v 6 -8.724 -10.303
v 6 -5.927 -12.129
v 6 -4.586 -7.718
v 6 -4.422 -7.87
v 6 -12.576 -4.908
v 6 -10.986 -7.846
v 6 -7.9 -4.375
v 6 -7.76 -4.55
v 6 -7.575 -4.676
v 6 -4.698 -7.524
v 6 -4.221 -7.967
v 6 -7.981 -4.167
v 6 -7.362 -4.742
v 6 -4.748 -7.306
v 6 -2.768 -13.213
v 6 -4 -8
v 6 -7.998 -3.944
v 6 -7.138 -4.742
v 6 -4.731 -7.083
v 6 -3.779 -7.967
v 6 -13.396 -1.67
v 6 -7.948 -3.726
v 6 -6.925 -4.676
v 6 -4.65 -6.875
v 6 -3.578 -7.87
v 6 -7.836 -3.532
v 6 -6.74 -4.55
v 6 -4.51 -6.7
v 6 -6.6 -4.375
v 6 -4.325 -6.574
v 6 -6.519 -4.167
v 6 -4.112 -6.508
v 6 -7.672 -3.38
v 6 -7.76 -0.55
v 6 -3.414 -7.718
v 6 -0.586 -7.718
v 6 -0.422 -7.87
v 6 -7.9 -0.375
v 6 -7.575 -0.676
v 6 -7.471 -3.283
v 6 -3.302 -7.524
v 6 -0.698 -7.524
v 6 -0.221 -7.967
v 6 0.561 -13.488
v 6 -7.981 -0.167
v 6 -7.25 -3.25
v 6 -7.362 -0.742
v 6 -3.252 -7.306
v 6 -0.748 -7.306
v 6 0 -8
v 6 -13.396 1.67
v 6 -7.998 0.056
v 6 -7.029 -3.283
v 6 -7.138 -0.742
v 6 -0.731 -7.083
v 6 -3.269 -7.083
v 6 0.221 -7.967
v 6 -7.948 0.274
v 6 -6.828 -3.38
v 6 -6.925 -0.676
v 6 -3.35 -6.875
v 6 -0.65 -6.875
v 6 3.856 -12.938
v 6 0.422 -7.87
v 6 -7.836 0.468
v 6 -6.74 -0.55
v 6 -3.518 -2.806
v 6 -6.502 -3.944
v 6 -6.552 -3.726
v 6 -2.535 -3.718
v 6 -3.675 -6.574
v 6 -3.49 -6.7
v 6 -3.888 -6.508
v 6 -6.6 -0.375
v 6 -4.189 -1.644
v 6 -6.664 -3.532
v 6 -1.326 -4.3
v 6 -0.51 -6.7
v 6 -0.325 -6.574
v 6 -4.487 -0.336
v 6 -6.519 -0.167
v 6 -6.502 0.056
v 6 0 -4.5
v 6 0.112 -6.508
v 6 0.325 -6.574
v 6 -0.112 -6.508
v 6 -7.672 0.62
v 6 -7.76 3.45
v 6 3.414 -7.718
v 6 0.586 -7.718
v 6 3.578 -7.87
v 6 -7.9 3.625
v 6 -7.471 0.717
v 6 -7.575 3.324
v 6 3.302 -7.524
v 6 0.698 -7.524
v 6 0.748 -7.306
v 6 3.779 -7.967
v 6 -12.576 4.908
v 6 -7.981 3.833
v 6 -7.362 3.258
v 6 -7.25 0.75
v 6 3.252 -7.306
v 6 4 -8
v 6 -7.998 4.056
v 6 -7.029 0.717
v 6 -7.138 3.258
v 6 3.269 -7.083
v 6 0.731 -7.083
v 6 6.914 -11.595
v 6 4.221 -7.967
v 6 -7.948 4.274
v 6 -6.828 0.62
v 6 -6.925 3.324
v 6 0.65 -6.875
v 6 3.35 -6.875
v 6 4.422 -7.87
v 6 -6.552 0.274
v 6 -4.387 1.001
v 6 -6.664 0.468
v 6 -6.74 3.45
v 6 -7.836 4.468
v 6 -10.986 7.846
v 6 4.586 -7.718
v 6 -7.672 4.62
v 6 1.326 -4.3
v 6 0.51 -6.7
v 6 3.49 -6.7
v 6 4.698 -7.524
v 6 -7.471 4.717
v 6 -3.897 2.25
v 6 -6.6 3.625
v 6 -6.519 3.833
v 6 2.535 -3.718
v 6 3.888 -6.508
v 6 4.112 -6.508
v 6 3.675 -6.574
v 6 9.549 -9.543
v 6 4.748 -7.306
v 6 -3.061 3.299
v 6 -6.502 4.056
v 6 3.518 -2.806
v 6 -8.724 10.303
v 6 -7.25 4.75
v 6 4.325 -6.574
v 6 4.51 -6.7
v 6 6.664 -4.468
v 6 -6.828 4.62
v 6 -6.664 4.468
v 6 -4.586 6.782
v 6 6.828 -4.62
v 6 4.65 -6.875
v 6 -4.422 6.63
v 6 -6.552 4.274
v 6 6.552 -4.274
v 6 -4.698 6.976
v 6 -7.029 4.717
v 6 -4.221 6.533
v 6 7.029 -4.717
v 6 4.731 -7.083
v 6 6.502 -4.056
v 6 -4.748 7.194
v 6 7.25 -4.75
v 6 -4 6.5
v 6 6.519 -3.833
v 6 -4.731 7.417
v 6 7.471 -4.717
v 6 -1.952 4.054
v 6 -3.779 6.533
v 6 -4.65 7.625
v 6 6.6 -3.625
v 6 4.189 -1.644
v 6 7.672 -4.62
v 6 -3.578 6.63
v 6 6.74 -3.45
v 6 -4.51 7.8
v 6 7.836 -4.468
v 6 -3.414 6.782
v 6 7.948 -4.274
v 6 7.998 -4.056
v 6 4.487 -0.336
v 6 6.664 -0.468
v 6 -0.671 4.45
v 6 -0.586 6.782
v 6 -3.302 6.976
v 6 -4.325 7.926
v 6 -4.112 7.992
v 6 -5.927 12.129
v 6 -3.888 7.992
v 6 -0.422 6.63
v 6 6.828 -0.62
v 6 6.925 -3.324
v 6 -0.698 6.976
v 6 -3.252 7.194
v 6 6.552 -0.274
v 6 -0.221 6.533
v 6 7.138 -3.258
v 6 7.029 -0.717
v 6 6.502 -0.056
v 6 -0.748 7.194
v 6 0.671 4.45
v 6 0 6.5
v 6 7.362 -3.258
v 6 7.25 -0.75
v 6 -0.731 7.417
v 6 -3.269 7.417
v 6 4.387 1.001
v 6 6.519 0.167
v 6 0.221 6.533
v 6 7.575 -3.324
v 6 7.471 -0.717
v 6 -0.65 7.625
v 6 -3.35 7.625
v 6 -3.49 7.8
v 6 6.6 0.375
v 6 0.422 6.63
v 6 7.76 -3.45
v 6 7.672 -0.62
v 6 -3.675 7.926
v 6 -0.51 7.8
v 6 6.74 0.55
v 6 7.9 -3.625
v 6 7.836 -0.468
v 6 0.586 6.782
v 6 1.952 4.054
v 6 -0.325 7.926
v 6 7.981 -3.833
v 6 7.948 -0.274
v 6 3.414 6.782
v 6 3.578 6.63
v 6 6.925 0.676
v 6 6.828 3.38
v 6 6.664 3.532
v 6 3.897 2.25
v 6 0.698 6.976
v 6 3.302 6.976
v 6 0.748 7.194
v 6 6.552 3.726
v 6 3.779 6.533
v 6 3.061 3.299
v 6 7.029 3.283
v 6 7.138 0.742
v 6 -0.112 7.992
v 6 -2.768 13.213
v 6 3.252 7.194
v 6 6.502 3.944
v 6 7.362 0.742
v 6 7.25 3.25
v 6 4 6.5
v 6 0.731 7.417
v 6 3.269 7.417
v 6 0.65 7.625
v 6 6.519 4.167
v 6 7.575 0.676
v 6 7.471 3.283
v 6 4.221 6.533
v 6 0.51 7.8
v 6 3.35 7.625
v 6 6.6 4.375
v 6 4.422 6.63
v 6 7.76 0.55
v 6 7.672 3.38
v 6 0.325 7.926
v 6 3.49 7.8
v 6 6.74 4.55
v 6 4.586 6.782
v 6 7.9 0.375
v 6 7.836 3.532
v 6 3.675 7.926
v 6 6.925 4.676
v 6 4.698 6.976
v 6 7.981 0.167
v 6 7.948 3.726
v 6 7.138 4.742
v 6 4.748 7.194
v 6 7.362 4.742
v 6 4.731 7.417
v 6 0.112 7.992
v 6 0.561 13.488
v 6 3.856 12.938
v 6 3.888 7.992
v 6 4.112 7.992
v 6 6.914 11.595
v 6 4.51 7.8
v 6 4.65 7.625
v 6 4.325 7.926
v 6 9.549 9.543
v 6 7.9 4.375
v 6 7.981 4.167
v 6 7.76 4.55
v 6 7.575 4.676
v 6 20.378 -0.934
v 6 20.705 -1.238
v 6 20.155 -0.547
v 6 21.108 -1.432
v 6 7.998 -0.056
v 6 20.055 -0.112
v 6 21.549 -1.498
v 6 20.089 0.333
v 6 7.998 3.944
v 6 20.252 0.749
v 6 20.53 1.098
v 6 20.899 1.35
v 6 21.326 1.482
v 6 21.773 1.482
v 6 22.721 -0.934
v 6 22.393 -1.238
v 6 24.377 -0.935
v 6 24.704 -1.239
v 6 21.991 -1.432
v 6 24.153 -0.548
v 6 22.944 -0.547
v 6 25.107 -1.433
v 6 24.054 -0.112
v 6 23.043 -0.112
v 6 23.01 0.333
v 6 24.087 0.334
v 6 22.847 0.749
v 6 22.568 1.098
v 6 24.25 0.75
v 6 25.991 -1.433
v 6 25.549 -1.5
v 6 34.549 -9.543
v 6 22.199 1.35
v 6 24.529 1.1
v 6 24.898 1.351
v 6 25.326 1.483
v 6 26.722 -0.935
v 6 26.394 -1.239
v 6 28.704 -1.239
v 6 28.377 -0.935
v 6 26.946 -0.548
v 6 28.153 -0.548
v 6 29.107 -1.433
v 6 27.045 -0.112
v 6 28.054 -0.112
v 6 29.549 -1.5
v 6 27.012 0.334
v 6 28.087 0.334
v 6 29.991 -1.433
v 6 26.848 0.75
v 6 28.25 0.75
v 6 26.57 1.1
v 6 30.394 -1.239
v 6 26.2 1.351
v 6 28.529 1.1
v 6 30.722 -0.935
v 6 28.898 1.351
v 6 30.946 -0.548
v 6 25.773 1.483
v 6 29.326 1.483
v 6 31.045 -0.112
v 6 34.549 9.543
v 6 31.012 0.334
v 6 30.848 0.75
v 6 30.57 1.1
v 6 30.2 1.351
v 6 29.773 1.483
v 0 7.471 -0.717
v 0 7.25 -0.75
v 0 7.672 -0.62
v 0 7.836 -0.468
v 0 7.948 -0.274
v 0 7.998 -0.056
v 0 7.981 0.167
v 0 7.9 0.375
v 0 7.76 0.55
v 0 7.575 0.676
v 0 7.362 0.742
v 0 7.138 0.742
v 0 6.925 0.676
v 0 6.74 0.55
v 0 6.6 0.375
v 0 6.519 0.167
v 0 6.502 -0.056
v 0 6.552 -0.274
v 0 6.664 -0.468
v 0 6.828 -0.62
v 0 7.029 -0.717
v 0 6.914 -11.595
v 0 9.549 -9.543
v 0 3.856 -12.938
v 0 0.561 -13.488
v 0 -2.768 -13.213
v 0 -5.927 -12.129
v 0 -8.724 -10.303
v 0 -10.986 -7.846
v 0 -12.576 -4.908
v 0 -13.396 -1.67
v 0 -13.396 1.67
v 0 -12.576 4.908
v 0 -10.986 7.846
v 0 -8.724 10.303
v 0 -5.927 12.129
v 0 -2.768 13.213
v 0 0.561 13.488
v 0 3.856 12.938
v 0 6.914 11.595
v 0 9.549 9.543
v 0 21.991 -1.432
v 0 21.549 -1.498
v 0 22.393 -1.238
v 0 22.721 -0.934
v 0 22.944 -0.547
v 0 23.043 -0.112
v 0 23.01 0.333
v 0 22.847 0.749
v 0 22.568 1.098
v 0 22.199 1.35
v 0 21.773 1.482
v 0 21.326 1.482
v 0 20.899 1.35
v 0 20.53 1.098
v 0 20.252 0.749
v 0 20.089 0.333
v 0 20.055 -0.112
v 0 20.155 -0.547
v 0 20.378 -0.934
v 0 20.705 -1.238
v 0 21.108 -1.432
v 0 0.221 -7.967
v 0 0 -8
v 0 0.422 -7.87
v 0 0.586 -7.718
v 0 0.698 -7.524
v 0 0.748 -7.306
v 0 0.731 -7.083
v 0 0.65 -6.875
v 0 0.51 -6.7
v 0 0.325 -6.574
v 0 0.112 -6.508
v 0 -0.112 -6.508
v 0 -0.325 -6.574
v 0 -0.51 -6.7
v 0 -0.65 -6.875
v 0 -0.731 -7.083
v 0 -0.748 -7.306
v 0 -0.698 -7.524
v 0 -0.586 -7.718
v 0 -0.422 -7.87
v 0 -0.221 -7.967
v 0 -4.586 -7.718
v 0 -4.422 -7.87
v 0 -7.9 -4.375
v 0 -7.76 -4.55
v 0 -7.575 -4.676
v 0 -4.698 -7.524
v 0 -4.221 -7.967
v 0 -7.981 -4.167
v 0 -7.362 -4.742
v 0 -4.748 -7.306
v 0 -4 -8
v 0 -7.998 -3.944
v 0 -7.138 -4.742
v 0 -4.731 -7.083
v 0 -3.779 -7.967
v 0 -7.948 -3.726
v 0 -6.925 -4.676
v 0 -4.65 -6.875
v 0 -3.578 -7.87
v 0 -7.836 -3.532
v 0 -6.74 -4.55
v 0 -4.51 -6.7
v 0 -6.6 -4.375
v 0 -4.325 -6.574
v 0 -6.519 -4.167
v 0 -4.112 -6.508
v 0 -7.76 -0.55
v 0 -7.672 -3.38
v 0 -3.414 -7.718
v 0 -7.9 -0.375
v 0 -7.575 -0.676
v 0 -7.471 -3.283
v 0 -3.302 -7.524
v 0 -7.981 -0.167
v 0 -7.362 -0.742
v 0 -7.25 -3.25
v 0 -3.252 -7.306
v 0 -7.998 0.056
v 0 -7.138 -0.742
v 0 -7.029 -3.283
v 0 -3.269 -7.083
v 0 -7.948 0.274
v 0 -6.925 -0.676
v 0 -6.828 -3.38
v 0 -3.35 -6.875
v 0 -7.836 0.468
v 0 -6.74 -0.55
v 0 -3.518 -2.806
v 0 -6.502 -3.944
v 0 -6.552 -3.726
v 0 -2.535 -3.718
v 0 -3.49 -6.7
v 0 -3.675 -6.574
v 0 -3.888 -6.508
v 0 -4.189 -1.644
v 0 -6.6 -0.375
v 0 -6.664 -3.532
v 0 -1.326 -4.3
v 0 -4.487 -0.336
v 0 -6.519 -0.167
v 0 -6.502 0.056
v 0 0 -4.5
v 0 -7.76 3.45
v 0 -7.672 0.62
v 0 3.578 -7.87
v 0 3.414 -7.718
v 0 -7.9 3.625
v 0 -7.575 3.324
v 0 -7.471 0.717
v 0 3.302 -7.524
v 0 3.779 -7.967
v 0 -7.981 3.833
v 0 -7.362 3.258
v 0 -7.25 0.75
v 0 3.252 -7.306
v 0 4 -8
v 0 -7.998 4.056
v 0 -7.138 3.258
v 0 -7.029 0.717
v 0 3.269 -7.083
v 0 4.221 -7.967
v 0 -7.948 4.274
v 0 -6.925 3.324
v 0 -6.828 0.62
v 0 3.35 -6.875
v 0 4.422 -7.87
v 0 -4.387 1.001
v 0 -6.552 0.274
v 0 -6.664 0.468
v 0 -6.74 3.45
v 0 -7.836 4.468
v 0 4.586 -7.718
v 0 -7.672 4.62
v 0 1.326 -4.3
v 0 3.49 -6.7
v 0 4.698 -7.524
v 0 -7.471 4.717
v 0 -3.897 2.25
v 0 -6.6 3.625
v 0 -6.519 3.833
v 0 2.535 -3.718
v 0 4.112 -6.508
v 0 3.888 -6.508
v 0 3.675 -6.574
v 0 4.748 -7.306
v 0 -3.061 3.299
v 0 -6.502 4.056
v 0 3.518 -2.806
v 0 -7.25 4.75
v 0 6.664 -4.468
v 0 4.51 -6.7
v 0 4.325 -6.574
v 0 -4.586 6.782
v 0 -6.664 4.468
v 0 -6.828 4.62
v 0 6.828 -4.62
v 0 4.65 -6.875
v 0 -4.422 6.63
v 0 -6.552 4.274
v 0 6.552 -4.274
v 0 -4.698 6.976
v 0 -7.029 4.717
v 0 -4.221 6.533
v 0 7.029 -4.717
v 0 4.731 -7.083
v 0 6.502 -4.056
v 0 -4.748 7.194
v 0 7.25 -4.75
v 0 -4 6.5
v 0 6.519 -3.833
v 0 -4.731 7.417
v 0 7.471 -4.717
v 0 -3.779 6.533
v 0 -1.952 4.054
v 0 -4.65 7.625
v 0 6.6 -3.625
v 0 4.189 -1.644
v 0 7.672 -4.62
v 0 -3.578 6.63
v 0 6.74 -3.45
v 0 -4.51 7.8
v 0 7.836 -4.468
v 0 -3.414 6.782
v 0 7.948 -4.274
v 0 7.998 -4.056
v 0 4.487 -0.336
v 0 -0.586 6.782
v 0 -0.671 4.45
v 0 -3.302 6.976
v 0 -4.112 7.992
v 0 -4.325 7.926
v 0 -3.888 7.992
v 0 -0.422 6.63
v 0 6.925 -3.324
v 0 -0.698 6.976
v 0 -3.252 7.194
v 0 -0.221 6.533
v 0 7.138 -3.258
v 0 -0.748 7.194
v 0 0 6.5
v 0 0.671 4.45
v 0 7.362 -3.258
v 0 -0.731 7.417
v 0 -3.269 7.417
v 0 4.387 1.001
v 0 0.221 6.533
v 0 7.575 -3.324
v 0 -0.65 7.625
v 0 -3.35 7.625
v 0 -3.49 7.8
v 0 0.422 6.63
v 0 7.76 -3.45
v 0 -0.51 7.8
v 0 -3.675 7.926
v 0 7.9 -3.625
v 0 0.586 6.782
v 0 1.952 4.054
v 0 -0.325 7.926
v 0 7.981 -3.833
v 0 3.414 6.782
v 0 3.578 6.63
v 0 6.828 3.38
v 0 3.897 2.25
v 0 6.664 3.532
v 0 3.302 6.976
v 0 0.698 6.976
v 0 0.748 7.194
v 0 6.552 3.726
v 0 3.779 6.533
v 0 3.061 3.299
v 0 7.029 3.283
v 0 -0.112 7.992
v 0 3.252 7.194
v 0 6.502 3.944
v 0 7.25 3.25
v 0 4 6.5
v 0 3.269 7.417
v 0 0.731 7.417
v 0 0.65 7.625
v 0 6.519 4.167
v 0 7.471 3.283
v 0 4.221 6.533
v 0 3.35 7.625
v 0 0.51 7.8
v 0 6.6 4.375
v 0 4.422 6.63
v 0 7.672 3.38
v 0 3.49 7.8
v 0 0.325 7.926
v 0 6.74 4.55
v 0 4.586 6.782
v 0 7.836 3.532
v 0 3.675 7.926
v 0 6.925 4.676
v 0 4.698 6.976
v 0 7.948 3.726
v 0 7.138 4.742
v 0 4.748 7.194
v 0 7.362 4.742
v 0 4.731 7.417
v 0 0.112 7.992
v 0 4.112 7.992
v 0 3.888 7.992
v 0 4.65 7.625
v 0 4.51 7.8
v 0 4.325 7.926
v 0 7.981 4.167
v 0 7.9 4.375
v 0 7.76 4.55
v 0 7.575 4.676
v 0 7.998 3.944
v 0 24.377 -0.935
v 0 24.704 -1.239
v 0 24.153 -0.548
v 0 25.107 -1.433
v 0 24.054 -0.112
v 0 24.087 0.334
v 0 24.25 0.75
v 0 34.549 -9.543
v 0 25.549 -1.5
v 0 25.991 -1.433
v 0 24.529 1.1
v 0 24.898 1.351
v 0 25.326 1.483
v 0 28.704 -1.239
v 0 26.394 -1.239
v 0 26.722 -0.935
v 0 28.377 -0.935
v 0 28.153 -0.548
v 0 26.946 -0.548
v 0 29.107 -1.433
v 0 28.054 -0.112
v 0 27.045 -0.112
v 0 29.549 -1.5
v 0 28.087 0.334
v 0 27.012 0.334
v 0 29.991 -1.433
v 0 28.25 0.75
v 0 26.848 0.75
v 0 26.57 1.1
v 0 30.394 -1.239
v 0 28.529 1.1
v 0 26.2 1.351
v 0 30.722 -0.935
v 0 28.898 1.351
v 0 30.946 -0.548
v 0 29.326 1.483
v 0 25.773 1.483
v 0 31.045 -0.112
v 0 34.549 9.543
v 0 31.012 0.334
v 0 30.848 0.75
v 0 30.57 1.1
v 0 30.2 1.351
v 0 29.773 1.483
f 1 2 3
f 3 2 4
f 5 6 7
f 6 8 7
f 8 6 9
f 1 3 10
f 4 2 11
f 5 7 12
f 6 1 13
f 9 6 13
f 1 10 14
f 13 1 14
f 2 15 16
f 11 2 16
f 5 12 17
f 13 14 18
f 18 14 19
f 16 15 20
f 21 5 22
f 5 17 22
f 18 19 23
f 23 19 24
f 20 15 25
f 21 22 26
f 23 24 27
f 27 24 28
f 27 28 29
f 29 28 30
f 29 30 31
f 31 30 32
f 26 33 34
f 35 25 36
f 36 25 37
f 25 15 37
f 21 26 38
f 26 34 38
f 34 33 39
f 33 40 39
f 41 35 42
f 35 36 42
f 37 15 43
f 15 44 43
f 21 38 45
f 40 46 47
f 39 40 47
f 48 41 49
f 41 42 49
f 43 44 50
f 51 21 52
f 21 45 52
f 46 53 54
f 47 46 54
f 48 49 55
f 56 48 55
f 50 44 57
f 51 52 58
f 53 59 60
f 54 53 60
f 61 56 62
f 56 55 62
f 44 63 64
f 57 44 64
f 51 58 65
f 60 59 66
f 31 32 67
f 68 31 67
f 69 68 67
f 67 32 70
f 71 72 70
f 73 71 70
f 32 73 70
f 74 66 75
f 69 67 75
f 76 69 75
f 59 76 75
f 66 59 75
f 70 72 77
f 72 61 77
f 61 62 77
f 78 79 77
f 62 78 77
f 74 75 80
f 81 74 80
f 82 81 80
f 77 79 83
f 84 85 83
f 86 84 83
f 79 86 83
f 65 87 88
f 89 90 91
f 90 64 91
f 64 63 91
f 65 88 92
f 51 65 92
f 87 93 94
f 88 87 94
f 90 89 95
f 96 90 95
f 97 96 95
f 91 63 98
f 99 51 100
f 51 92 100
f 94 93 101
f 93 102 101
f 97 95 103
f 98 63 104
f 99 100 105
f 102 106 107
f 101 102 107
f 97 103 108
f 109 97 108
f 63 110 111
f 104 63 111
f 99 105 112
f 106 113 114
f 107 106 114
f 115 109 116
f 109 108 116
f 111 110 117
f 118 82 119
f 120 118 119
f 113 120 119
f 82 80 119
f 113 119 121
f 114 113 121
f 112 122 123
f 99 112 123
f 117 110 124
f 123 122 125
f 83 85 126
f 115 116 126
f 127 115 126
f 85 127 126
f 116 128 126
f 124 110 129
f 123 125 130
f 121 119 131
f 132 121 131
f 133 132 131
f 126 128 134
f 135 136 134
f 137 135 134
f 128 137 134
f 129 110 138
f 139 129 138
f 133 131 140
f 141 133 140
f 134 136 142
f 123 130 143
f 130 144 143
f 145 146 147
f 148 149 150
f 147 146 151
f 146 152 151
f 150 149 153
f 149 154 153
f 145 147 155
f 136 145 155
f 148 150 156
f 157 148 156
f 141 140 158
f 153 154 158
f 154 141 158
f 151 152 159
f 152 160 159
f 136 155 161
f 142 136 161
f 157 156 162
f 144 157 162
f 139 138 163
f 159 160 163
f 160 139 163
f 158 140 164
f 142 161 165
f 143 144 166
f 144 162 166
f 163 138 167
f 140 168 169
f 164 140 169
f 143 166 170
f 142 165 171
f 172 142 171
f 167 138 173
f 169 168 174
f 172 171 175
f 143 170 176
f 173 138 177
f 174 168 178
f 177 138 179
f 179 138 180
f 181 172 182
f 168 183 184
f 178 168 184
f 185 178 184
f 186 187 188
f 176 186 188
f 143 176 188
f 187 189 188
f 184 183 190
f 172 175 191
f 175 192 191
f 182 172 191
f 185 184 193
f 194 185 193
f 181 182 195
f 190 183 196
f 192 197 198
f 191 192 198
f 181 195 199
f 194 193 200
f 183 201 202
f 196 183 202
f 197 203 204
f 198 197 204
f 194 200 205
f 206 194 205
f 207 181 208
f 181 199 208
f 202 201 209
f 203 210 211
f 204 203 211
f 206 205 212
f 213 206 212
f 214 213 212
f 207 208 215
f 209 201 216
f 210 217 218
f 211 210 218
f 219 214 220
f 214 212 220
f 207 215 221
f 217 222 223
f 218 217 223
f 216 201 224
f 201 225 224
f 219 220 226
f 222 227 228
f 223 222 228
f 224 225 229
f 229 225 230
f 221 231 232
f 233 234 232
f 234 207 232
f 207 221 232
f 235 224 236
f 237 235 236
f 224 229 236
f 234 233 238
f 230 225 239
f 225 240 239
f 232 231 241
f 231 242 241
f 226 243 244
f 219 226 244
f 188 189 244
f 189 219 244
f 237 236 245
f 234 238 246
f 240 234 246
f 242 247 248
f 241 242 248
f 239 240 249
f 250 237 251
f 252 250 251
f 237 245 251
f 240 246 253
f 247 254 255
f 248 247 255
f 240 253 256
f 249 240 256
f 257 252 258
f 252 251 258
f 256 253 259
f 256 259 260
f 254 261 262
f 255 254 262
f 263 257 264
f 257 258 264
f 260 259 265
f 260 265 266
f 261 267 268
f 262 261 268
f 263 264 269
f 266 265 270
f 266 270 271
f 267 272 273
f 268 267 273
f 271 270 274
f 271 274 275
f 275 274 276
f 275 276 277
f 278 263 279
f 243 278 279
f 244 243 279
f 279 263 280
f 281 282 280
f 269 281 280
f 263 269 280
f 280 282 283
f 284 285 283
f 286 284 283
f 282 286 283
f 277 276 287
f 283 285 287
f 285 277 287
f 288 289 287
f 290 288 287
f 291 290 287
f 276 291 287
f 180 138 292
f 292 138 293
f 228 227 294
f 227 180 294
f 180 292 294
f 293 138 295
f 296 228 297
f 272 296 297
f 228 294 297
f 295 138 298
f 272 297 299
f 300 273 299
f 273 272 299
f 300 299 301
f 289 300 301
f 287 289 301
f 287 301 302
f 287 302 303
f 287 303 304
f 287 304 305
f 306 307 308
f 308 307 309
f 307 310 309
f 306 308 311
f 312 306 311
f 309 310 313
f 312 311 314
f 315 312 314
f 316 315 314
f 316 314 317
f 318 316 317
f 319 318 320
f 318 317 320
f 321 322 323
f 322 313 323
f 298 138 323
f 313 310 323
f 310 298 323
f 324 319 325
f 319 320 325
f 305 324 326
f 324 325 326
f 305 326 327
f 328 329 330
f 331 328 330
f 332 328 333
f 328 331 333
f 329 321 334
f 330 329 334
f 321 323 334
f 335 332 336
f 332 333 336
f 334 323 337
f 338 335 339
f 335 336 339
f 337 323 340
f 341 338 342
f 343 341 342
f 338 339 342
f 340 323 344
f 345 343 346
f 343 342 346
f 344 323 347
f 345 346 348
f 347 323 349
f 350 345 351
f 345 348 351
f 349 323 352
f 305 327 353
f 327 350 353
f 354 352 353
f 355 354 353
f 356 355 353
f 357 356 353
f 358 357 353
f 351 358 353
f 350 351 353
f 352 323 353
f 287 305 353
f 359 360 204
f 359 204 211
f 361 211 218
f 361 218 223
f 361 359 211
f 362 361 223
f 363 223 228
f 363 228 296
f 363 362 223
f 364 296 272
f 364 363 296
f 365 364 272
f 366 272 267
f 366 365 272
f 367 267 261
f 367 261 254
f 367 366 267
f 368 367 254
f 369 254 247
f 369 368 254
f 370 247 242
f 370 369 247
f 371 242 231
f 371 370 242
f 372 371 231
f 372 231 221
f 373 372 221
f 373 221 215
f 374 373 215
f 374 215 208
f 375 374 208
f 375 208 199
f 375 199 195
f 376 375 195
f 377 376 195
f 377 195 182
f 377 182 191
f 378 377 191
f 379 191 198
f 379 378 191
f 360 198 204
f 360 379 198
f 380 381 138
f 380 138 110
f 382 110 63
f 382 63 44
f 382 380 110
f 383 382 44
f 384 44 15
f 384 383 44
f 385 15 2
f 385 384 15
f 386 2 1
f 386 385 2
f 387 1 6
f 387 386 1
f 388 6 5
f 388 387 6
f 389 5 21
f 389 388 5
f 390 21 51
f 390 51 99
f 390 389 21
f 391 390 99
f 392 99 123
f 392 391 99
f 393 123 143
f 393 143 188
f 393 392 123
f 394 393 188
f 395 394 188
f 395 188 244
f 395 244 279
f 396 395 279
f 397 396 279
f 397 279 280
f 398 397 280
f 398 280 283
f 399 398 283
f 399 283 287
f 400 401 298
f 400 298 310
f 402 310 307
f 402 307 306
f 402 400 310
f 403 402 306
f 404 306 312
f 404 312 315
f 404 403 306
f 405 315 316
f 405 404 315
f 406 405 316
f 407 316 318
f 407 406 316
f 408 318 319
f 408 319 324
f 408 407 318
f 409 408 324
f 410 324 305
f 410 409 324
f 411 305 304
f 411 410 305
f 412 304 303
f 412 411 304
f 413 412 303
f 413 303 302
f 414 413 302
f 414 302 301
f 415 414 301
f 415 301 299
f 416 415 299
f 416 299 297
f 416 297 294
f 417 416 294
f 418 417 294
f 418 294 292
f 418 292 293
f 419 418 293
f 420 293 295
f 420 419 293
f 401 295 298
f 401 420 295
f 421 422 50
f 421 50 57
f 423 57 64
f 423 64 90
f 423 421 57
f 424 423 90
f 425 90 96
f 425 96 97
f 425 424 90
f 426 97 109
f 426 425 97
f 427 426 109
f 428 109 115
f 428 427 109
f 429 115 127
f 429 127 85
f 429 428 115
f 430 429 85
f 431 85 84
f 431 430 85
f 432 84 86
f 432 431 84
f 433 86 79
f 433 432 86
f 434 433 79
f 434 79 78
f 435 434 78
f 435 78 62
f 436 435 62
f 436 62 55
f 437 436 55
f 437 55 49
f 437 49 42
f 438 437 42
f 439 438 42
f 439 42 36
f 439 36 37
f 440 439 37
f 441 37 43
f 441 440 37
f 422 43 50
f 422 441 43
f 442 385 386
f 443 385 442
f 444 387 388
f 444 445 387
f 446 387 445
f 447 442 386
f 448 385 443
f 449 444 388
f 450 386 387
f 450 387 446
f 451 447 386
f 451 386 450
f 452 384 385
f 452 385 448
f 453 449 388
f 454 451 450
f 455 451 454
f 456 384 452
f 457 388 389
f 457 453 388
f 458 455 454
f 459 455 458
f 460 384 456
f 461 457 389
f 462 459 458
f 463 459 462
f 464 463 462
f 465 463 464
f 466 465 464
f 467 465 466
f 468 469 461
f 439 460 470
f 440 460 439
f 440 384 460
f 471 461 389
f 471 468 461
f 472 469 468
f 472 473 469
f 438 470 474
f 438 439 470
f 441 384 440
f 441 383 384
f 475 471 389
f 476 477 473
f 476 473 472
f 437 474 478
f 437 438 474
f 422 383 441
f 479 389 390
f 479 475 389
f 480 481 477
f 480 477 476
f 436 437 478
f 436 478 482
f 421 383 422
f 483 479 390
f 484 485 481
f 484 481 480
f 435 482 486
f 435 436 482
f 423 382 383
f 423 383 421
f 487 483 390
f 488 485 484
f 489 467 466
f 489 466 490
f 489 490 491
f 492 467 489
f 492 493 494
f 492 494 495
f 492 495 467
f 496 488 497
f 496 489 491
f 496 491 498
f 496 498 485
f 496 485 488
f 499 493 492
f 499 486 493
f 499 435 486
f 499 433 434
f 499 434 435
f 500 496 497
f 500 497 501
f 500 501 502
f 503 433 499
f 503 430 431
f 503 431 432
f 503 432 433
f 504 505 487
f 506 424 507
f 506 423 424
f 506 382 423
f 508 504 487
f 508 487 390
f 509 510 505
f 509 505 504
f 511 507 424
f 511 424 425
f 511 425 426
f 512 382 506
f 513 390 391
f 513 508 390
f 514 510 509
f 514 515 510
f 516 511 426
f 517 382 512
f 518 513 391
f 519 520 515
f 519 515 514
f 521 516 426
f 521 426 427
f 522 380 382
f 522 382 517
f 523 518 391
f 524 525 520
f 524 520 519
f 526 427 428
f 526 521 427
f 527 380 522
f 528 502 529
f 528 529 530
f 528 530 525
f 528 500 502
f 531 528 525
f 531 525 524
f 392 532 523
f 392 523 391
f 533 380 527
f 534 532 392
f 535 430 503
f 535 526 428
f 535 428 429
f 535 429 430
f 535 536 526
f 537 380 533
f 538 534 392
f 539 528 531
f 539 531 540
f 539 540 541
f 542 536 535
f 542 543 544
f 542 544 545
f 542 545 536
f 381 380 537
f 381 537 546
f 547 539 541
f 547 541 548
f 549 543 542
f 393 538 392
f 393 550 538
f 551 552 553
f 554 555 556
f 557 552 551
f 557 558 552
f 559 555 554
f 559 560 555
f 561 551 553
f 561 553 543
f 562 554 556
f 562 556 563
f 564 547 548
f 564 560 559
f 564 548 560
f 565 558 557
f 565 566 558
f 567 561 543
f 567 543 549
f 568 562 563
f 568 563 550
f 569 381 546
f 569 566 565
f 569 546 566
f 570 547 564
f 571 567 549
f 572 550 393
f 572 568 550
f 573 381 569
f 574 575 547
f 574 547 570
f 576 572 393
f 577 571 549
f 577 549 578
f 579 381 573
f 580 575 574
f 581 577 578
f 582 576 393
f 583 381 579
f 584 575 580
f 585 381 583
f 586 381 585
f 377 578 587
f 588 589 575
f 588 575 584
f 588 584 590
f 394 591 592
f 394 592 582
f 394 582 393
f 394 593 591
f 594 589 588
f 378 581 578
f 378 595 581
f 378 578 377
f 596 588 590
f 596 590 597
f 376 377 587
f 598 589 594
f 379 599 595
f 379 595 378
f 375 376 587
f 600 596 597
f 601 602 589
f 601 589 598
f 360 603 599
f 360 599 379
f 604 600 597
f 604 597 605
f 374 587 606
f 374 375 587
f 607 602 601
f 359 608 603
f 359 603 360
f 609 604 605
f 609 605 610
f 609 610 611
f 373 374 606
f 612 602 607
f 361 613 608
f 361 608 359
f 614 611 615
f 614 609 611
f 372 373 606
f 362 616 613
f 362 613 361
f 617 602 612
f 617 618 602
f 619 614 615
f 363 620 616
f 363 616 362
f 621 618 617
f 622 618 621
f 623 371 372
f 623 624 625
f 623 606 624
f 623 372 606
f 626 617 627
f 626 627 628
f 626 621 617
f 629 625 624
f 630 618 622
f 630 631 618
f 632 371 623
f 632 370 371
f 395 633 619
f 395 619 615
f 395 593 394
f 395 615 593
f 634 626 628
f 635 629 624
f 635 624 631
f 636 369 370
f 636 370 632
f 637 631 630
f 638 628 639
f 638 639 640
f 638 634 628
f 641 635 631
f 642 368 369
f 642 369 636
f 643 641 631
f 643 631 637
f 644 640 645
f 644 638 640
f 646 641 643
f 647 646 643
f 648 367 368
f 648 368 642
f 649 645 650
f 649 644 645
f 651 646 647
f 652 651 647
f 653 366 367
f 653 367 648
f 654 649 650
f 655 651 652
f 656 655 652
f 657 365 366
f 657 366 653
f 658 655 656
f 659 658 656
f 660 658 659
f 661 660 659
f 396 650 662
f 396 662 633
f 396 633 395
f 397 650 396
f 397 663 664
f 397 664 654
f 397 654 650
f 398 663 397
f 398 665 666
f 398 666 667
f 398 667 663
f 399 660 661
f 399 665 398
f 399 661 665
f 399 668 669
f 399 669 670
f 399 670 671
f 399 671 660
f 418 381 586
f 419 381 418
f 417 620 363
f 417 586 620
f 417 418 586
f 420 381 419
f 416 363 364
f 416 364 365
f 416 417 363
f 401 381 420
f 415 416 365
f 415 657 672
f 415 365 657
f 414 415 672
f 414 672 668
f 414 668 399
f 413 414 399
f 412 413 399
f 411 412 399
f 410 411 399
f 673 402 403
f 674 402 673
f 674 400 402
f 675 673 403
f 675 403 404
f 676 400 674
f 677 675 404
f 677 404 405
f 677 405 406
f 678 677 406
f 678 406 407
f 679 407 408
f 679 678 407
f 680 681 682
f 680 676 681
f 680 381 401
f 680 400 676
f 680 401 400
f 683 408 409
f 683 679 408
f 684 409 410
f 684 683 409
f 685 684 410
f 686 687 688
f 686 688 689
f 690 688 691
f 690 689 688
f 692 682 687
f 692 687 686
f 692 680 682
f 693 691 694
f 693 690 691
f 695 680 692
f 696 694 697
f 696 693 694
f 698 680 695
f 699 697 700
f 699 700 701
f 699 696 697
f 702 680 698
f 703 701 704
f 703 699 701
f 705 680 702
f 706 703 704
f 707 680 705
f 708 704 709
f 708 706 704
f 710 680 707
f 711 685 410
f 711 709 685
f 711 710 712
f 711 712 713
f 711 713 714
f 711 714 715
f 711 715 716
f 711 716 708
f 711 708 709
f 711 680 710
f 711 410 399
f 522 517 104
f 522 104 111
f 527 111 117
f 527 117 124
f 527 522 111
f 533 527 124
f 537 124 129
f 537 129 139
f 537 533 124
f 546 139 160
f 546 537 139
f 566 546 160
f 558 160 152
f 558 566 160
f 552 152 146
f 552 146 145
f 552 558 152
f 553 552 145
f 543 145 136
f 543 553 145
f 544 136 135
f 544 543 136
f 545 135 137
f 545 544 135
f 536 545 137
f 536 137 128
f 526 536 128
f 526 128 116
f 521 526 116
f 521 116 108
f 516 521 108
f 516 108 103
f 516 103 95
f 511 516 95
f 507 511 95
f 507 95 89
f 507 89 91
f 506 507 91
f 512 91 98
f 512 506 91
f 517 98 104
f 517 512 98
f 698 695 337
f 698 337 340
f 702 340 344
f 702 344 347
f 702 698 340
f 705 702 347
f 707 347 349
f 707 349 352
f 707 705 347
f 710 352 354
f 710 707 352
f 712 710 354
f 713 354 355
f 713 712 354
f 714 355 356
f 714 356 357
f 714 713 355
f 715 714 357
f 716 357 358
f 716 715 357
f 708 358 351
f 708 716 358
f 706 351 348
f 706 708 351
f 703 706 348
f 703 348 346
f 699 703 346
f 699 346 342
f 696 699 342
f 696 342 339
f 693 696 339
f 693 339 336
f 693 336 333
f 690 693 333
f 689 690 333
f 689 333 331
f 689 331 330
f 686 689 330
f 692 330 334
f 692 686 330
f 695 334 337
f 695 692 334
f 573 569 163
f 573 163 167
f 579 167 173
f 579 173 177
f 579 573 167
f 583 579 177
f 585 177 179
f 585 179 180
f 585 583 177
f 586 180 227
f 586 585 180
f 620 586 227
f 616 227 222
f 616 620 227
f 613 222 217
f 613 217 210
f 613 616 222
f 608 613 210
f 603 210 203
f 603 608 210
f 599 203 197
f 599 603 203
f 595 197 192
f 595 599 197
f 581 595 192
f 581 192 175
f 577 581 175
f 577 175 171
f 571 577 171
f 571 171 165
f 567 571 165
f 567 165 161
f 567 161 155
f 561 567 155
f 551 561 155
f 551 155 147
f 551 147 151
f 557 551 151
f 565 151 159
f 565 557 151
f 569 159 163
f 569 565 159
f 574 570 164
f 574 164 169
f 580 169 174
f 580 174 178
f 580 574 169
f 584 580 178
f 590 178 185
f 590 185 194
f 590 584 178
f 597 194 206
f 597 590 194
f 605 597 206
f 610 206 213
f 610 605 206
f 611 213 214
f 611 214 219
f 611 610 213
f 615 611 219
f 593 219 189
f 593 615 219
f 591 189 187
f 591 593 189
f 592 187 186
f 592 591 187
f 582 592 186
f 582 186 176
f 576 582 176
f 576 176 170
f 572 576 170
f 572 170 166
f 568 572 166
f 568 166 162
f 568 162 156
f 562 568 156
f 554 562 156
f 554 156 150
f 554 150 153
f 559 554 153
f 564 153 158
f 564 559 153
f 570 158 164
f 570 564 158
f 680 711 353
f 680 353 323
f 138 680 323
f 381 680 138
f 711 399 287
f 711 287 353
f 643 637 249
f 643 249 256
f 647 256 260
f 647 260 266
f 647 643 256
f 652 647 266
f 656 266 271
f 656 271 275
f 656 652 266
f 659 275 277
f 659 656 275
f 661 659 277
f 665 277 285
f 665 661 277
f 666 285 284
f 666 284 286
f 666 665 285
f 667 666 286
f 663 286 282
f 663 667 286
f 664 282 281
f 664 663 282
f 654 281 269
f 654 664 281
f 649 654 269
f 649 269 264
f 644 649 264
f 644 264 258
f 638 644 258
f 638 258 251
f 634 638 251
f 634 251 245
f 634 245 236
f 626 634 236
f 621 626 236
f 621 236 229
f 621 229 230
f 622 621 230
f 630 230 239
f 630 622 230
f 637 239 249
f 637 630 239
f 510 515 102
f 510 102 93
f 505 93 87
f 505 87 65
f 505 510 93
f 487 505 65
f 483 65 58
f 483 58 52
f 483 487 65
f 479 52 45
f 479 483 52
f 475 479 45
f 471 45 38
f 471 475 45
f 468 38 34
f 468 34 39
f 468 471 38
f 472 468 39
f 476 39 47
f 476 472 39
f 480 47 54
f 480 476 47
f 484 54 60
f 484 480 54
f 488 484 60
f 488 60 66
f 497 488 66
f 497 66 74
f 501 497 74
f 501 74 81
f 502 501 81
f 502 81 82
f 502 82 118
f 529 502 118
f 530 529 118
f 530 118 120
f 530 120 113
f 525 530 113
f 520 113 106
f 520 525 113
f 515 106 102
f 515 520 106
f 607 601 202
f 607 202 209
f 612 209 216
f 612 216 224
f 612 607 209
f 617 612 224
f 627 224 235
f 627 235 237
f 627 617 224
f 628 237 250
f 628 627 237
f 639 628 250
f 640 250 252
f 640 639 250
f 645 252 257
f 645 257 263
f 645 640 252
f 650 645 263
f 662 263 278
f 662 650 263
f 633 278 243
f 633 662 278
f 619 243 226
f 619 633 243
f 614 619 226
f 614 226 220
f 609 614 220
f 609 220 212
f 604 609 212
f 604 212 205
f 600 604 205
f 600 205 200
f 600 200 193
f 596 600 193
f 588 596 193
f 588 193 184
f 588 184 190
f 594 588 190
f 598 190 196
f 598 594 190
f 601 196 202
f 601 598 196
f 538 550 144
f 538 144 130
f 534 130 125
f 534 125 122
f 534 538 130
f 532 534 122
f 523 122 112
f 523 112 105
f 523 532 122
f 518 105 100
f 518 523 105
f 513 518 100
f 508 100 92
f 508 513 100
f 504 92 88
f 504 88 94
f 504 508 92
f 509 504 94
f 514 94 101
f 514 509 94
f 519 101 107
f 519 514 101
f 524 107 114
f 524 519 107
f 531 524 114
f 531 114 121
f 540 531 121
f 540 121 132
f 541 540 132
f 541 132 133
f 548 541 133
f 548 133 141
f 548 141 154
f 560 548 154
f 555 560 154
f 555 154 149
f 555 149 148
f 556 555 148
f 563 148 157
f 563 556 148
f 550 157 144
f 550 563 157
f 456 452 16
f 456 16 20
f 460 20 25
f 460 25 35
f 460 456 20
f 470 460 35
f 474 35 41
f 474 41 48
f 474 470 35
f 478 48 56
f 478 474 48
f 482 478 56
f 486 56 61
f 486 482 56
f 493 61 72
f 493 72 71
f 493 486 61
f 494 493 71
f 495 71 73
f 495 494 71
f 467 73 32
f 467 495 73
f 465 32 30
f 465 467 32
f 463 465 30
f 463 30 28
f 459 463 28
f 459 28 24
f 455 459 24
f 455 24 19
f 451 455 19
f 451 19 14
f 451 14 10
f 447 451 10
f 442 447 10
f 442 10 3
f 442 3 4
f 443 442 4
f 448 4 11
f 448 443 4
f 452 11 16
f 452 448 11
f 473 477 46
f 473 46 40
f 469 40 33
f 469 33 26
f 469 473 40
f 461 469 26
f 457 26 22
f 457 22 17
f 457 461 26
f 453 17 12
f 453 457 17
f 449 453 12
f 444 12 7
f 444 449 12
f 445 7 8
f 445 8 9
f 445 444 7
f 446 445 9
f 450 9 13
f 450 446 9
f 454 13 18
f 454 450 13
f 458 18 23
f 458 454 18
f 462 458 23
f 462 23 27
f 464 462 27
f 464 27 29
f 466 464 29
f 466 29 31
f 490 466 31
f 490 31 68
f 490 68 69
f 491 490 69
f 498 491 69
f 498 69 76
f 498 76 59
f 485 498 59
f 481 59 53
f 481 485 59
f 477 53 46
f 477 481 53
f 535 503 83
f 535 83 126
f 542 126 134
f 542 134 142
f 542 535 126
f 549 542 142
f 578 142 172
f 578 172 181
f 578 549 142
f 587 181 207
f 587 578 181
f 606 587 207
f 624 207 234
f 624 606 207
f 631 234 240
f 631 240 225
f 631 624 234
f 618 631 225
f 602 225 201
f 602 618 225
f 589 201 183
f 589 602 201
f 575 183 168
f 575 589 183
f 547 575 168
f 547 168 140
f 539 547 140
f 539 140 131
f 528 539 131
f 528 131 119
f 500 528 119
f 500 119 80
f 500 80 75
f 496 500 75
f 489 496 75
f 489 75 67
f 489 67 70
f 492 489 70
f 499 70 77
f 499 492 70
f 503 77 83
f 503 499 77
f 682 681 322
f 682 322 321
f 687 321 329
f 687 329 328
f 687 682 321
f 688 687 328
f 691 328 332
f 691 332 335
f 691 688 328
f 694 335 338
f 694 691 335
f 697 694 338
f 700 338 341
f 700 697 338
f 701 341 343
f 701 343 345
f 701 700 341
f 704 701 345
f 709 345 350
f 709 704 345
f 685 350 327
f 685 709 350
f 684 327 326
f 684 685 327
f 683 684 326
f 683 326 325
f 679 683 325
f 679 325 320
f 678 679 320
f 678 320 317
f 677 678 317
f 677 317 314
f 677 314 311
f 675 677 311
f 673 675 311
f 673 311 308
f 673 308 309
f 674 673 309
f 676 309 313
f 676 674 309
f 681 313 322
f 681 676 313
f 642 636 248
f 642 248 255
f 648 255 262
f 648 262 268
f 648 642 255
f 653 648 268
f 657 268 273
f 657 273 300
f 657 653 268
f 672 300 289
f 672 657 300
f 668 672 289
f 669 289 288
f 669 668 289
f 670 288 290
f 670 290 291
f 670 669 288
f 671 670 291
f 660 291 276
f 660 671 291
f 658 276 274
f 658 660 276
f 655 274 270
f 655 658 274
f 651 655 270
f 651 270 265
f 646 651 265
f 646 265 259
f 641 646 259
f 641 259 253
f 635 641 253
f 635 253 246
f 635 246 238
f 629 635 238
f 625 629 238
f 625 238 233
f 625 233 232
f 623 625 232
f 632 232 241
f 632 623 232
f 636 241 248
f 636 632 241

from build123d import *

# Parameters (mm, degrees)
SKETCH1_R           = 4.5
SKETCH1_R_2         = 0.75
SKETCH1_R_3         = 1.5
SKETCH1_R_4         = 1.498254454
BOSS_EXTRUDE1_DEPTH = 6


with BuildPart() as part:
    # Sketch1 → Boss-Extrude1 (new body)
    with BuildSketch(Plane(origin=(0, 0, 0), x_dir=(0, 0, -1), z_dir=(1, 0, 0))):
        with BuildLine():
            Line((-9.542574057, 9.549307848), (-9.542574057, 34.549307848))
            Line((-9.542574057, 34.549307848), (9.542574057, 34.549307848))
            Line((9.542574057, 34.549307848), (9.542574057, 9.549307848))
            ThreePointArc((9.542574057, 9.549307848), (0, -13.5), (-9.542574057, 9.549307848))
        make_face()
        Circle(SKETCH1_R, mode=Mode.SUBTRACT)
        with Locations((0, 7.25)):
            Circle(SKETCH1_R_2, mode=Mode.SUBTRACT)
        with Locations((4, 7.25)):
            Circle(SKETCH1_R_2, mode=Mode.SUBTRACT)
        with Locations((-4, 7.25)):
            Circle(SKETCH1_R_2, mode=Mode.SUBTRACT)
        with Locations(Location((4, -7.25, 0), (0, 0, 180))):
            Circle(SKETCH1_R_2, mode=Mode.SUBTRACT)
        with Locations(Location((0, -7.25, 0), (0, 0, 180))):
            Circle(SKETCH1_R_2, mode=Mode.SUBTRACT)
        with Locations(Location((-4, -7.25, 0), (0, 0, 180))):
            Circle(SKETCH1_R_2, mode=Mode.SUBTRACT)
        with Locations((7.25, -4)):
            Circle(SKETCH1_R_2, mode=Mode.SUBTRACT)
        with Locations((7.25, 0)):
            Circle(SKETCH1_R_2, mode=Mode.SUBTRACT)
        with Locations((7.25, 4)):
            Circle(SKETCH1_R_2, mode=Mode.SUBTRACT)
        with Locations((-7.25, 4)):
            Circle(SKETCH1_R_2, mode=Mode.SUBTRACT)
        with Locations((-7.25, 0)):
            Circle(SKETCH1_R_2, mode=Mode.SUBTRACT)
        with Locations((-7.25, -4)):
            Circle(SKETCH1_R_2, mode=Mode.SUBTRACT)
        with Locations((0, 29.549307848)):
            Circle(SKETCH1_R_3, mode=Mode.SUBTRACT)
        with Locations((0, 25.549307848)):
            Circle(SKETCH1_R_3, mode=Mode.SUBTRACT)
        with Locations((0, 21.549307848)):
            Circle(SKETCH1_R_4, mode=Mode.SUBTRACT)
    extrude(amount=BOSS_EXTRUDE1_DEPTH)


solid = part.part
